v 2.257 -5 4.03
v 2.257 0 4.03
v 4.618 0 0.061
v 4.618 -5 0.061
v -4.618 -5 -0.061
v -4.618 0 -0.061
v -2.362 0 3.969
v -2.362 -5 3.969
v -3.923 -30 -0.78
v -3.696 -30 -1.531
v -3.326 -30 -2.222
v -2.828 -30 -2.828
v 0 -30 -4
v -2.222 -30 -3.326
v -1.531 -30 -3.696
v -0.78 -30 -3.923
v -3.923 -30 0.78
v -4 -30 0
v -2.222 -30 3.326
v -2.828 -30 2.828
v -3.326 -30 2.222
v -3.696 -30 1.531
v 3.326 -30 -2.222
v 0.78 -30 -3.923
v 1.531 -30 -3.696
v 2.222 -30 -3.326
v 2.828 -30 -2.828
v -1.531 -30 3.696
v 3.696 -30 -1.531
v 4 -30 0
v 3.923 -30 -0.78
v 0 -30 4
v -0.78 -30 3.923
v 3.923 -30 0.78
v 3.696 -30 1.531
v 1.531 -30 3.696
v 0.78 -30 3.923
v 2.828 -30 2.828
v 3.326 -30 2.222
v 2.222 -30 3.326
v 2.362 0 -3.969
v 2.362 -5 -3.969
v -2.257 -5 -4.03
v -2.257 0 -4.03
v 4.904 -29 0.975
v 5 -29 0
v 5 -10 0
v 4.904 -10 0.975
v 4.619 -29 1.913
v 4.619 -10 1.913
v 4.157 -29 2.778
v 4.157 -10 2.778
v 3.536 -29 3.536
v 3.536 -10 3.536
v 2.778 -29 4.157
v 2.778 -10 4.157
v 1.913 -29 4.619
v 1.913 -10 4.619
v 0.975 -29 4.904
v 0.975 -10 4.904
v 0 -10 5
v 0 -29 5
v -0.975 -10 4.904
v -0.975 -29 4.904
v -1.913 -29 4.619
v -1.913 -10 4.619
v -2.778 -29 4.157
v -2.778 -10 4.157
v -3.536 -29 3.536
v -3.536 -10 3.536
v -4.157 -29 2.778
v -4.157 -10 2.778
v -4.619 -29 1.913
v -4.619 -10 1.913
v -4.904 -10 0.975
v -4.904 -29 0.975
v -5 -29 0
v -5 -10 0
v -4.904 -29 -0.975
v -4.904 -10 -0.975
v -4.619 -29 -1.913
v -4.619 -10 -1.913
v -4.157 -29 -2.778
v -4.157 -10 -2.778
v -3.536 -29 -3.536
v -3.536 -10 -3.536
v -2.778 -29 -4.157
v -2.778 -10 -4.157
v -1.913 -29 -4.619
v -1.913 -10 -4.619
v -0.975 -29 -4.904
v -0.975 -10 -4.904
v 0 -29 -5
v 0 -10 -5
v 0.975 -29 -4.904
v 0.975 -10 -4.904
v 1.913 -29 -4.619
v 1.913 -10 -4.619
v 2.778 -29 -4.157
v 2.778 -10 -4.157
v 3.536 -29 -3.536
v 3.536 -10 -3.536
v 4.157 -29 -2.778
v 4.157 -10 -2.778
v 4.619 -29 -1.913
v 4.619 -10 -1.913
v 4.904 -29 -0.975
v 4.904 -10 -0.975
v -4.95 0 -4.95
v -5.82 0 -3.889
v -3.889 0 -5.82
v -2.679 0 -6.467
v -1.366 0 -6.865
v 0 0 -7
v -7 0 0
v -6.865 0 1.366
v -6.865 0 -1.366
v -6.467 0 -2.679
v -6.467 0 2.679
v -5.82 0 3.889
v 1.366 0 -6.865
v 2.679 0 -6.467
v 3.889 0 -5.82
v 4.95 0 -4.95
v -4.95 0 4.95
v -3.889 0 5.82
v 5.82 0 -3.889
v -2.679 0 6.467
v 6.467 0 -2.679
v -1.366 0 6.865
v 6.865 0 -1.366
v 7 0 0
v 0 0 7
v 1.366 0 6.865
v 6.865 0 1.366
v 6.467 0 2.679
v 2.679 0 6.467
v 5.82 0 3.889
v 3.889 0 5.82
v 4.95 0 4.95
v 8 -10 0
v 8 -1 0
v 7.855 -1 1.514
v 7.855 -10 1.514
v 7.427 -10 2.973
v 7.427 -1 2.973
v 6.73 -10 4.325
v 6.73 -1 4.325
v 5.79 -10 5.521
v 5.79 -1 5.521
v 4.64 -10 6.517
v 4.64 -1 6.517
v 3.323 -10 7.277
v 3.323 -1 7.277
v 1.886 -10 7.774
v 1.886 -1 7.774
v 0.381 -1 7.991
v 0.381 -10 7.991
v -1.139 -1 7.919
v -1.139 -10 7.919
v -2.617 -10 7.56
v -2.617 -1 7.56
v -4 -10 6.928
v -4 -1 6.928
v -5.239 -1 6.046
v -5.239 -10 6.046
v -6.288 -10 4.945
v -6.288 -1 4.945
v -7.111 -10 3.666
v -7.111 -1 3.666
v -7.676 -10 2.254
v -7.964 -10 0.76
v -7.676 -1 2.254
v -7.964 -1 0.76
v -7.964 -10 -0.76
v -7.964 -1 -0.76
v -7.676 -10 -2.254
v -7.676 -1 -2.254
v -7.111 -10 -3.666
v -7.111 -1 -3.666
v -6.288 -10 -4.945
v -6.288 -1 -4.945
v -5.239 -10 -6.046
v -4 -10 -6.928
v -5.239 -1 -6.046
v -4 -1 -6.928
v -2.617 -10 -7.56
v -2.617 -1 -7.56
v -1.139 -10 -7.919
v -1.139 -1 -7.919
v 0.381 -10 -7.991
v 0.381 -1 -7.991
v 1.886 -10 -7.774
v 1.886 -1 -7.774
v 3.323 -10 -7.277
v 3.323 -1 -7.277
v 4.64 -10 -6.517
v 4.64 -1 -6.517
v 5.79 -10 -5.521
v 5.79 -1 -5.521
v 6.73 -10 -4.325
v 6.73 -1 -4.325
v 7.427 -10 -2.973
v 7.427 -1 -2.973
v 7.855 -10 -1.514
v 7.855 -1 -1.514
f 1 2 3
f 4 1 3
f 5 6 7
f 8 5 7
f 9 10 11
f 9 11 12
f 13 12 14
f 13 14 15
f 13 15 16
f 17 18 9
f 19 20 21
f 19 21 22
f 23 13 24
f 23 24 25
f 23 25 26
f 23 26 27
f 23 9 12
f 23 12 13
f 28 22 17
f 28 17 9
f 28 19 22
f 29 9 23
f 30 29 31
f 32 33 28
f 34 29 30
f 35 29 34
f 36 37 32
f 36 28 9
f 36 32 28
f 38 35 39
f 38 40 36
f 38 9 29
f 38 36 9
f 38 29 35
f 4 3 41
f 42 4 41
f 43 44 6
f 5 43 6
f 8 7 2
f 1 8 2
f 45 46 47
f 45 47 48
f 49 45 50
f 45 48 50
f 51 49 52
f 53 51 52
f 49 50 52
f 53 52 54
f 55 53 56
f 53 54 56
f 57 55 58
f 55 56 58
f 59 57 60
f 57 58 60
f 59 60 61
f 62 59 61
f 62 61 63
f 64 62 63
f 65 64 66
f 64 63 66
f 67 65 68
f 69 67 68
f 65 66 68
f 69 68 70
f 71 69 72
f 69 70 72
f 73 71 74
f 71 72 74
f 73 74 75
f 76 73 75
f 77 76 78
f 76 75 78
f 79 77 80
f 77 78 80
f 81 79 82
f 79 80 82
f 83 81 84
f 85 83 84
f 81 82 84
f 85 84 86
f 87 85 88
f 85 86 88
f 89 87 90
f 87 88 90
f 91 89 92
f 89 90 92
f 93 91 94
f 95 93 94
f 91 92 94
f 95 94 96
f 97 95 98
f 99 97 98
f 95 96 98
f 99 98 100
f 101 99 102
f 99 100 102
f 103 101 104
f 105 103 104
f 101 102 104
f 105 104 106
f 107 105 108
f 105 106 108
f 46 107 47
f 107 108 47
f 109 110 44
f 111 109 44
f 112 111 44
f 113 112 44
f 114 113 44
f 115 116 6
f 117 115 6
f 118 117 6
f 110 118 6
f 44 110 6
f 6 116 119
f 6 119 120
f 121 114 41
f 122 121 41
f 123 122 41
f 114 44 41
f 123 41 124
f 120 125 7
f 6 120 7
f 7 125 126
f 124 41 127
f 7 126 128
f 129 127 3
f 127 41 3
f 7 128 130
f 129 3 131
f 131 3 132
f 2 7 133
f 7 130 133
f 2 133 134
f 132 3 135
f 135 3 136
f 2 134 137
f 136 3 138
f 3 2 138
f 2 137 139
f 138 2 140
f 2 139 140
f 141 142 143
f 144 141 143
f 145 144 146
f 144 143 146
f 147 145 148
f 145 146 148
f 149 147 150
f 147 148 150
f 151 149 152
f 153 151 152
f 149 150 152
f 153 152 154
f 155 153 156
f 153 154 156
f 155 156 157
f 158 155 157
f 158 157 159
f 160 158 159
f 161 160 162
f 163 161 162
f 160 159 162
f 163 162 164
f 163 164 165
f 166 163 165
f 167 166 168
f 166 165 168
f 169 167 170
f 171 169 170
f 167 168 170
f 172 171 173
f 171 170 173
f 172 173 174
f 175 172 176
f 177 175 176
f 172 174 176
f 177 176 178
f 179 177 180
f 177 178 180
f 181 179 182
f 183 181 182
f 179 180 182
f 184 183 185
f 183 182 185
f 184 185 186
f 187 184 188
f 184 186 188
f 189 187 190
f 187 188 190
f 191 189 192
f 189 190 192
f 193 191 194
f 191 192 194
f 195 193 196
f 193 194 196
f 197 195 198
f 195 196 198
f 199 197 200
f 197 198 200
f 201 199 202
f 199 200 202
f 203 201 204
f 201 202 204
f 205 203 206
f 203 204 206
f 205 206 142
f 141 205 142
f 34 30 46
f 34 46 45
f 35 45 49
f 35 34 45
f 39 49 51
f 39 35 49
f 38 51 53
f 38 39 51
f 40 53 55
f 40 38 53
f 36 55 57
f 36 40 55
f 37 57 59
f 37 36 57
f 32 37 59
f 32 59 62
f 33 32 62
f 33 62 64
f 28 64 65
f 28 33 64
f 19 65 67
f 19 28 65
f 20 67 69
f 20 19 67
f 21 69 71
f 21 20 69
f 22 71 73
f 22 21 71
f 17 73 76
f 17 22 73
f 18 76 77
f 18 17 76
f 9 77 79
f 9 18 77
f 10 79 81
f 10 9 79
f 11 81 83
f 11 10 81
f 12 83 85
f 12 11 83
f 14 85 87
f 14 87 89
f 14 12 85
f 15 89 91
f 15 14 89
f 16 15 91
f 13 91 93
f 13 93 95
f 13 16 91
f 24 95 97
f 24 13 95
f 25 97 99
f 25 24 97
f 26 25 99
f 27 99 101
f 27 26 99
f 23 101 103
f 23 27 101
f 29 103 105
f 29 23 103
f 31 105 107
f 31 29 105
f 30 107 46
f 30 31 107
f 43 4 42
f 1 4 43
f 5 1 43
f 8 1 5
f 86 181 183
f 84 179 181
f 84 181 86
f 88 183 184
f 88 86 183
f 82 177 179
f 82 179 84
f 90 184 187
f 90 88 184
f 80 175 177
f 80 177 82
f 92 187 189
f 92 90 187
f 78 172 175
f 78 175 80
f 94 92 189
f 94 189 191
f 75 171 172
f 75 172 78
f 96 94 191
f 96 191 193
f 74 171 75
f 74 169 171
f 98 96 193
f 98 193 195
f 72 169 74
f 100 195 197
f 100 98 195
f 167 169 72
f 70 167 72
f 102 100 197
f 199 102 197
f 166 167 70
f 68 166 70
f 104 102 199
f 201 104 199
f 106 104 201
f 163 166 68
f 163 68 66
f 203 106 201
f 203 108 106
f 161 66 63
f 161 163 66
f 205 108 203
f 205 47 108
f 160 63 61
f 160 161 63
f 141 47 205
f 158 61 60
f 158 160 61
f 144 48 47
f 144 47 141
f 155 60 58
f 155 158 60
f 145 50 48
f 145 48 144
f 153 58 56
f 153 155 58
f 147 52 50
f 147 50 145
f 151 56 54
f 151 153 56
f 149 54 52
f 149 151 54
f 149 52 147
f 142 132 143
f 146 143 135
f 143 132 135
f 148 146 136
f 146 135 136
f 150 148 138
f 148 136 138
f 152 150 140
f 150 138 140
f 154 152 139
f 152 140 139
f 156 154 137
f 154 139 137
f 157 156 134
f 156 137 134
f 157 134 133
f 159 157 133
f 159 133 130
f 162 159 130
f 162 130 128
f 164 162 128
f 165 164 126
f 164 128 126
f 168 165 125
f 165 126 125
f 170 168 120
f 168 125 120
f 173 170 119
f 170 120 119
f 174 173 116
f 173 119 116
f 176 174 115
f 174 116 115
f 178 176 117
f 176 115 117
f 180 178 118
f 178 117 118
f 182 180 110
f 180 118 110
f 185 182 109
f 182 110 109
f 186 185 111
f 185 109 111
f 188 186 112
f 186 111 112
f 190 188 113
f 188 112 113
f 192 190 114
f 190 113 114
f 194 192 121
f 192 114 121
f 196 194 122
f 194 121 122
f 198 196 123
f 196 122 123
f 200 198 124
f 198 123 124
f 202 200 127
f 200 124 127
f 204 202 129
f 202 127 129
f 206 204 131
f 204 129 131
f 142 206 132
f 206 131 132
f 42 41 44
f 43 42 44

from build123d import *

# Parameters (mm, degrees)
F0_R     = 8
F1_DEPTH = 10
F2_R     = 5
F3_DEPTH = 20
F4_SIZE  = 1
F6_DEPTH = 5


with BuildPart() as f1:
    # F0 (on Front) → F1 (new body)
    with BuildSketch(Plane.XZ):
        Circle(F0_R)
    extrude(amount=F1_DEPTH)

    # F2 (on face) → F3 (join)
    with BuildSketch(Plane.XZ.offset(10)):
        Circle(F2_R)
    extrude(amount=F3_DEPTH)

    # F4
    f4_edges = [f1.edges().sort_by_distance(p)[0] for p in [
        (-5, -30, 0),
        (-8, 0, 0),
    ]]
    chamfer(f4_edges, length=F4_SIZE)

    # F5 (on face) → F6 (cut)
    with BuildSketch(Plane(origin=(0, 0, 0), x_dir=(-1, 0, 0), z_dir=(0, 1, 0))):
        Polygon((-4.618402, 0.06081), (-2.361864, -3.969249), (2.256538, -4.030058), (4.618402, -0.06081), (2.361864, 3.969249), (-2.256538, 4.030058), align=None)
    extrude(amount=-F6_DEPTH, mode=Mode.SUBTRACT)


solid = f1.part
